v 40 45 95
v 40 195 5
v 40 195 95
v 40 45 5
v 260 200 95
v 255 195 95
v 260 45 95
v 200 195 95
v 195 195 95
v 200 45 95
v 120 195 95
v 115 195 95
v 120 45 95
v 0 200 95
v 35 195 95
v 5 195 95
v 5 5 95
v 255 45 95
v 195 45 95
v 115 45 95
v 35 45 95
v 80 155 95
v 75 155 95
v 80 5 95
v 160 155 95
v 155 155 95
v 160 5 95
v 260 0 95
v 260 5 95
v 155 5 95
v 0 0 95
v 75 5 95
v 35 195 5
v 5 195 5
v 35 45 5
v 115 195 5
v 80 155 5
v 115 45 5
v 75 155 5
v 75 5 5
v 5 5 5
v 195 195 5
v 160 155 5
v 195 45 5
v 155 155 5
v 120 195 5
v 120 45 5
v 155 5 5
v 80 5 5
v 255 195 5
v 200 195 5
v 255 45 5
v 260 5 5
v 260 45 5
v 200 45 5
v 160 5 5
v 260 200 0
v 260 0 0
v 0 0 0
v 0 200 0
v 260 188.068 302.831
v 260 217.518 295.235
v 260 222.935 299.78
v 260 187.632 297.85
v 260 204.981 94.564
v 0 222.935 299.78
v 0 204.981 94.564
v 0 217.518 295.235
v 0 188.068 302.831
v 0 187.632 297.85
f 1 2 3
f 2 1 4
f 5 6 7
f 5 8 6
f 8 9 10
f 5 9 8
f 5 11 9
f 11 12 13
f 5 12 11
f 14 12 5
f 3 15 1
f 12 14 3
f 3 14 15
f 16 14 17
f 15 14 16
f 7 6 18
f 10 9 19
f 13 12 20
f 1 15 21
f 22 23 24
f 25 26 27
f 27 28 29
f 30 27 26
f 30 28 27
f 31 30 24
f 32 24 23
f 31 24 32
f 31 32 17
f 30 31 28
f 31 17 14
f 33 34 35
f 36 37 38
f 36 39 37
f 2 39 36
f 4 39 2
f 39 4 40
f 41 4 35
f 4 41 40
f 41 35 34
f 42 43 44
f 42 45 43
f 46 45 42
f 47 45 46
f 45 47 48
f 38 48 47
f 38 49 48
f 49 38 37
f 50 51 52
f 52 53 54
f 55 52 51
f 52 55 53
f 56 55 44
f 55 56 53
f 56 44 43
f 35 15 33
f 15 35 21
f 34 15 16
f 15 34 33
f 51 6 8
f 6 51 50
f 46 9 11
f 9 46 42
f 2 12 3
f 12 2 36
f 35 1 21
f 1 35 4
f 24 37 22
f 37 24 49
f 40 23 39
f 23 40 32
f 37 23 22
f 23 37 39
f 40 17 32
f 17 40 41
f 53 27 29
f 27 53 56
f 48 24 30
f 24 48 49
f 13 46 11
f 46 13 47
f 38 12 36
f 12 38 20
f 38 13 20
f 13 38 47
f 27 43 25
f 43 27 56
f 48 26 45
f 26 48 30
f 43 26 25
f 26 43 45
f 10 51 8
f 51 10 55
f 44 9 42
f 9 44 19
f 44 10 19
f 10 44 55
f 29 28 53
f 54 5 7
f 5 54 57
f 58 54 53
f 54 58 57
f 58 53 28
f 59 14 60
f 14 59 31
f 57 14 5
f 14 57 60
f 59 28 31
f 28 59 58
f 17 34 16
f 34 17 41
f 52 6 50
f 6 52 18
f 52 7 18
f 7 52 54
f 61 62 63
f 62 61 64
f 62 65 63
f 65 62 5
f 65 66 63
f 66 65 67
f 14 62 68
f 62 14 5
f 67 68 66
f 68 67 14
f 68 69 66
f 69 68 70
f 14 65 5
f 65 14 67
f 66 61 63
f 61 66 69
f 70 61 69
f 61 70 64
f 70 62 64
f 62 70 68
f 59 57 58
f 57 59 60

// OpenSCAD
// Hinged sound box - parametric OpenSCAD model
// Exported from the Hinged Sound Box editor on 2026-10-08.
// Units: millimetres. Z is up. X runs left to right, Y runs front to back.
// Origin: outer front-left-bottom corner of base A.
// Edit the values below, or use Window > Customizer in OpenSCAD.

/* [Body] */
// Outer length, left to right
length = 260;
// Outer depth of the body, front to back (the lid adds the flap and clearance)
depth = 200;
// Closed height: base + walls + lid
height = 100;
// Board thickness
t = 5;

/* [Lid and flap] */
// Lid opening angle in degrees; 0 is closed
lid_angle = 95; // [0:1:180]
// Drop of the front flap under the lid
flap_height = 30;
// Gap between the flap and the fixed front wall (does not scale with the box)
flap_clearance = 1;

/* [Outlet and baffles] */
// Opening beside the front wall at the right-hand end
outlet_width = 40;
// Number of internal baffles
baffle_count = 5; // [0:1:20]
// Left face of baffle 1, measured from the inside face of the left end wall
baffle_offset = 30;
// Distance from one baffle's left face to the next
baffle_pitch = 40;
// Air gap at the free end of each baffle
baffle_gap = 40;
// Baffle 1 attaches to the back wall; the rest alternate
first_baffle_back = true;

/* [Display] */
show_front_wall = true;
show_lid = true;

/* [Hidden] */
shell_color = "#f1f0ea";
baffle_color = "#f1f0ea";
lid_color = "#f1f0ea";
board_alpha = 1;
baffle_colors = [];

inner_l = length - 2 * t;
inner_w = depth - 2 * t;
wall_h = height - 2 * t;
outlet_panel = inner_w - outlet_width;
baffle_len = inner_w - baffle_gap;
end_clear = inner_l - (baffle_offset + (baffle_count - 1) * baffle_pitch + t);

echo(str("Clear interior: ", inner_l, " x ", inner_w, " x ", wall_h, " mm"));
echo(str("Closed envelope: ", length, " x ", depth + t + flap_clearance, " x ", height, " mm"));
if (baffle_count > 0) echo(str("Clear past the last baffle: ", end_clear, " mm"));
if (wall_h <= 0) echo("WARNING: height must be more than two board thicknesses");
if (outlet_panel <= 0) echo("WARNING: outlet_width is as wide as the interior, so panel E is left out");
if (baffle_count > 0 && baffle_len <= 0) echo("WARNING: baffle_gap is as wide as the interior, so the baffles are left out");
if (baffle_count > 1 && baffle_pitch <= t) echo("WARNING: baffle_pitch is not larger than t, so the baffles overlap");
if (baffle_count > 0 && end_clear <= 0) echo("WARNING: the last baffle runs into the outlet end wall");

module board(c, pos, size) color(c, board_alpha) translate(pos) cube(size);

// A  Base: every upright panel sits on it
board(shell_color, [0, 0, 0], [length, depth, t]);

if (wall_h > 0) {
  // C1  Back wall, outside face flush with the base edge
  board(shell_color, [0, depth - t, t], [length, t, wall_h]);
  // C2  Front wall
  if (show_front_wall) board(shell_color, [0, 0, t], [length, t, wall_h]);
  // D  Closed end, between the long walls at the left
  board(shell_color, [0, t, t], [t, inner_w, wall_h]);
  // E  Outlet end panel: touches the back wall and leaves the outlet beside the front wall
  if (outlet_panel > 0) board(shell_color, [length - t, depth - t - outlet_panel, t], [t, outlet_panel, wall_h]);
  // F  Internal baffles, alternating back / front
  if (baffle_count > 0 && baffle_len > 0)
    for (i = [0 : baffle_count - 1]) {
      back = (i % 2 == 0) == first_baffle_back;
      board(i < len(baffle_colors) ? baffle_colors[i] : baffle_color,
            [t + baffle_offset + i * baffle_pitch, back ? depth - t - baffle_len : t, t],
            [t, baffle_len, wall_h]);
    }
}

// B  Lid and G front flap, hinged with tape on the outside top edge of the back wall
if (show_lid)
  translate([0, depth, height - t]) rotate([-lid_angle, 0, 0]) translate([0, -depth, -(height - t)]) {
    board(lid_color, [0, -(t + flap_clearance), height - t], [length, depth + t + flap_clearance, t]);
    if (flap_height > 0)
      board(lid_color, [0, -(t + flap_clearance), height - t - flap_height], [length, t, flap_height]);
  }
